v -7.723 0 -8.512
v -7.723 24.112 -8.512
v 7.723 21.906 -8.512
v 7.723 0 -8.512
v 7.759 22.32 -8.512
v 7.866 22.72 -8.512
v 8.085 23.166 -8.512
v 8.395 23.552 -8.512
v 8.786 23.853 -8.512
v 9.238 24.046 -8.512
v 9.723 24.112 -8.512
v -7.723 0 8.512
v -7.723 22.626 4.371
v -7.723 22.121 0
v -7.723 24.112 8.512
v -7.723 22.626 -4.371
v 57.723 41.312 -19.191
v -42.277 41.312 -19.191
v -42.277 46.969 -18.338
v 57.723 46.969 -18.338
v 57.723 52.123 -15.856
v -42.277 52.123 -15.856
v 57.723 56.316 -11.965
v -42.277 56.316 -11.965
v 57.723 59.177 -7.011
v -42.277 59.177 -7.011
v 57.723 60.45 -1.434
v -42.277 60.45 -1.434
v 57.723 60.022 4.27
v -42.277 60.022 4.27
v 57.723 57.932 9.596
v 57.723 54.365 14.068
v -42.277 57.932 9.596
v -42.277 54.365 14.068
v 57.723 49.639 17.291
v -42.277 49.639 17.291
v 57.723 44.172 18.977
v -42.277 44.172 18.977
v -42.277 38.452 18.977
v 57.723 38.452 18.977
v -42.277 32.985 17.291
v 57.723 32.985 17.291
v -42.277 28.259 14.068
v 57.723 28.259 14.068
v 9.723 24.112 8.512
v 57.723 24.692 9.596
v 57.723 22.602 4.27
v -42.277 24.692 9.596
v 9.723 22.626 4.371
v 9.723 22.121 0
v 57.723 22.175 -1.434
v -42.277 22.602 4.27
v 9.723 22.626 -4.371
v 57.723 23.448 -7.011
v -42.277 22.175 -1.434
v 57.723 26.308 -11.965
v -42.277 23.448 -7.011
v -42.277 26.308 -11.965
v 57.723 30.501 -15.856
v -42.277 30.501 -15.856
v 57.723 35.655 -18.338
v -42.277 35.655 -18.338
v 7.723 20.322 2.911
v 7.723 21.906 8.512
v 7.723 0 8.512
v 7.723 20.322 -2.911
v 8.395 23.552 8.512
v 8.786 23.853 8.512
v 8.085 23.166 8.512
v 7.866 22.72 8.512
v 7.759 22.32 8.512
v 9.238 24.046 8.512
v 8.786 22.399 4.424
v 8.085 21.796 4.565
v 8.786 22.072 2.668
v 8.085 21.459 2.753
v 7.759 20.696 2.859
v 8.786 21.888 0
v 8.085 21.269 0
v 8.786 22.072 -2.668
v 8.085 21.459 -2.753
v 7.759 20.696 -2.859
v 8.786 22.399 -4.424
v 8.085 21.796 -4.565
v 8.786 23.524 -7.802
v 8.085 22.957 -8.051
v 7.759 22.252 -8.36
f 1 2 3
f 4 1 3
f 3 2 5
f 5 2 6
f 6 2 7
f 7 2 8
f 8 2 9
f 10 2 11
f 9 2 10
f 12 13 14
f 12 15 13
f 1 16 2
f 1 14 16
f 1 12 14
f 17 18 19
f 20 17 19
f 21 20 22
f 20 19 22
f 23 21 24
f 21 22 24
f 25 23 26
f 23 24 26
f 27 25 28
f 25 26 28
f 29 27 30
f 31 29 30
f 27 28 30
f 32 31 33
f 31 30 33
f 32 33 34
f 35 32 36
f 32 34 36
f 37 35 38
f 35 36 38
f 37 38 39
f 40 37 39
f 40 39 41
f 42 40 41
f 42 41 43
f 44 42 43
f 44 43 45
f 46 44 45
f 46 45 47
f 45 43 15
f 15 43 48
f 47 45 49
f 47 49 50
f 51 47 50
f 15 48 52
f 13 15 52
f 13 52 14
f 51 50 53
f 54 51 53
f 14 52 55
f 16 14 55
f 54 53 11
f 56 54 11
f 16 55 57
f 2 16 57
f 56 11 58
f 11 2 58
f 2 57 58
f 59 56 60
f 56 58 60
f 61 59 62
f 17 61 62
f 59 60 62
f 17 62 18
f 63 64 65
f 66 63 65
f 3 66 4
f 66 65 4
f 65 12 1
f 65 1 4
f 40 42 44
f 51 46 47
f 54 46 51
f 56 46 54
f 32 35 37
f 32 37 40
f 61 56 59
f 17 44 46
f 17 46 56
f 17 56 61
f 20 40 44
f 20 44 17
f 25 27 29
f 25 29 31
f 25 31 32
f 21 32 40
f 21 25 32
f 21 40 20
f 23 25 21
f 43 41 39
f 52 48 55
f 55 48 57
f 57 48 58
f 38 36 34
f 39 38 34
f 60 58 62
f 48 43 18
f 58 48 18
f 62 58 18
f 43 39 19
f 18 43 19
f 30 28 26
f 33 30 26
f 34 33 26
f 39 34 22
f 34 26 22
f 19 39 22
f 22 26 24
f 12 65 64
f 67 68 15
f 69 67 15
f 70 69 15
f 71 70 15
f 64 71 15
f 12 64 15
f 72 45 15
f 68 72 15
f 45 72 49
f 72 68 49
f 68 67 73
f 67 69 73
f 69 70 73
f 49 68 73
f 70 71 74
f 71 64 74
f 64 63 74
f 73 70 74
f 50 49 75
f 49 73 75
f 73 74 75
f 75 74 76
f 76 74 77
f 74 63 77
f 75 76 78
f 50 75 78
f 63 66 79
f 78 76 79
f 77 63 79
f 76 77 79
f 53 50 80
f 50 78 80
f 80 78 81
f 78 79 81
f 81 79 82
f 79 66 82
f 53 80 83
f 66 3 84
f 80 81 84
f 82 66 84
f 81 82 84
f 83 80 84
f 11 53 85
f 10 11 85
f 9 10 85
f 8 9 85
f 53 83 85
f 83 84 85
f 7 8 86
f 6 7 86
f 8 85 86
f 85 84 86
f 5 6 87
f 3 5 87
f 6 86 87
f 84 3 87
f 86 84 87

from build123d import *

# Parameters (mm, degrees)
SKETCH_1_W           = 15.445067976
SKETCH_1_H           = 17.0246772
EXTRUDE_1_DEPTH      = 50
EXTRUDE_2_DEPTH      = 50
EXTRUDE_2_DEPTH_BACK = 50
SKETCH_2_R           = 19.191040977
FILLET_3_R           = 2


with BuildPart() as part:
    # 草图1 → 凸台-拉伸1 (new body)
    with BuildSketch(Plane(origin=(0, 0, 0), x_dir=(1, 0, 0), z_dir=(0, 1, 0))):
        Rectangle(SKETCH_1_W, SKETCH_1_H)
    extrude(amount=EXTRUDE_1_DEPTH)

    # 草图2 → 凸台-拉伸2 (add, two sides: drawn at the far end of the back side and taken through both)
    with BuildSketch(Plane(origin=(7.722533988, 0, 0), x_dir=(0, 0, -1), z_dir=(1, 0, 0)).offset(-EXTRUDE_2_DEPTH_BACK)):
        with Locations((0, 41.312136517)):
            Circle(SKETCH_2_R)
    extrude(amount=EXTRUDE_2_DEPTH + EXTRUDE_2_DEPTH_BACK)

    # 圆角3
    # the kernel refuses this fillet: 2 mm, written as the material it adds along each edge
    with BuildSketch(Plane(origin=(7.722533988, 41.312136517, 0), x_dir=(0, -0.7517142761643256, 0.6594889286491047), z_dir=(0, 0.6594889286491047, 0.7517142761643256))) as fillet_3_piece_1_section:
        with BuildLine():
            CenterArc((19.191040977 + FILLET_3_R, FILLET_3_R), FILLET_3_R, 180, 90)
            Line((19.191040977, FILLET_3_R), (19.191040977, 0))
            Line((19.191040977, 0), (19.191040977 + FILLET_3_R, 0))
        make_face()
    fillet_3_piece_1 = revolve(axis=Axis((7.722533988, 41.312136517, 0), (1, 0, 0)), revolution_arc=82.521814453, mode=Mode.PRIVATE)
    fillet_3_piece_1 = split(fillet_3_piece_1, bisect_by=Plane(origin=(8.28980216, 21.553827368, -8.5123386), z_dir=(0, 0, 1)), keep=Keep.TOP, mode=Mode.PRIVATE)
    fillet_3_piece_1 = split(fillet_3_piece_1, bisect_by=Plane(origin=(8.28980216, 21.553827368, 8.5123386), z_dir=(0, 0, -1)), keep=Keep.TOP, mode=Mode.PRIVATE)
    add(fillet_3_piece_1)


solid = part.part
